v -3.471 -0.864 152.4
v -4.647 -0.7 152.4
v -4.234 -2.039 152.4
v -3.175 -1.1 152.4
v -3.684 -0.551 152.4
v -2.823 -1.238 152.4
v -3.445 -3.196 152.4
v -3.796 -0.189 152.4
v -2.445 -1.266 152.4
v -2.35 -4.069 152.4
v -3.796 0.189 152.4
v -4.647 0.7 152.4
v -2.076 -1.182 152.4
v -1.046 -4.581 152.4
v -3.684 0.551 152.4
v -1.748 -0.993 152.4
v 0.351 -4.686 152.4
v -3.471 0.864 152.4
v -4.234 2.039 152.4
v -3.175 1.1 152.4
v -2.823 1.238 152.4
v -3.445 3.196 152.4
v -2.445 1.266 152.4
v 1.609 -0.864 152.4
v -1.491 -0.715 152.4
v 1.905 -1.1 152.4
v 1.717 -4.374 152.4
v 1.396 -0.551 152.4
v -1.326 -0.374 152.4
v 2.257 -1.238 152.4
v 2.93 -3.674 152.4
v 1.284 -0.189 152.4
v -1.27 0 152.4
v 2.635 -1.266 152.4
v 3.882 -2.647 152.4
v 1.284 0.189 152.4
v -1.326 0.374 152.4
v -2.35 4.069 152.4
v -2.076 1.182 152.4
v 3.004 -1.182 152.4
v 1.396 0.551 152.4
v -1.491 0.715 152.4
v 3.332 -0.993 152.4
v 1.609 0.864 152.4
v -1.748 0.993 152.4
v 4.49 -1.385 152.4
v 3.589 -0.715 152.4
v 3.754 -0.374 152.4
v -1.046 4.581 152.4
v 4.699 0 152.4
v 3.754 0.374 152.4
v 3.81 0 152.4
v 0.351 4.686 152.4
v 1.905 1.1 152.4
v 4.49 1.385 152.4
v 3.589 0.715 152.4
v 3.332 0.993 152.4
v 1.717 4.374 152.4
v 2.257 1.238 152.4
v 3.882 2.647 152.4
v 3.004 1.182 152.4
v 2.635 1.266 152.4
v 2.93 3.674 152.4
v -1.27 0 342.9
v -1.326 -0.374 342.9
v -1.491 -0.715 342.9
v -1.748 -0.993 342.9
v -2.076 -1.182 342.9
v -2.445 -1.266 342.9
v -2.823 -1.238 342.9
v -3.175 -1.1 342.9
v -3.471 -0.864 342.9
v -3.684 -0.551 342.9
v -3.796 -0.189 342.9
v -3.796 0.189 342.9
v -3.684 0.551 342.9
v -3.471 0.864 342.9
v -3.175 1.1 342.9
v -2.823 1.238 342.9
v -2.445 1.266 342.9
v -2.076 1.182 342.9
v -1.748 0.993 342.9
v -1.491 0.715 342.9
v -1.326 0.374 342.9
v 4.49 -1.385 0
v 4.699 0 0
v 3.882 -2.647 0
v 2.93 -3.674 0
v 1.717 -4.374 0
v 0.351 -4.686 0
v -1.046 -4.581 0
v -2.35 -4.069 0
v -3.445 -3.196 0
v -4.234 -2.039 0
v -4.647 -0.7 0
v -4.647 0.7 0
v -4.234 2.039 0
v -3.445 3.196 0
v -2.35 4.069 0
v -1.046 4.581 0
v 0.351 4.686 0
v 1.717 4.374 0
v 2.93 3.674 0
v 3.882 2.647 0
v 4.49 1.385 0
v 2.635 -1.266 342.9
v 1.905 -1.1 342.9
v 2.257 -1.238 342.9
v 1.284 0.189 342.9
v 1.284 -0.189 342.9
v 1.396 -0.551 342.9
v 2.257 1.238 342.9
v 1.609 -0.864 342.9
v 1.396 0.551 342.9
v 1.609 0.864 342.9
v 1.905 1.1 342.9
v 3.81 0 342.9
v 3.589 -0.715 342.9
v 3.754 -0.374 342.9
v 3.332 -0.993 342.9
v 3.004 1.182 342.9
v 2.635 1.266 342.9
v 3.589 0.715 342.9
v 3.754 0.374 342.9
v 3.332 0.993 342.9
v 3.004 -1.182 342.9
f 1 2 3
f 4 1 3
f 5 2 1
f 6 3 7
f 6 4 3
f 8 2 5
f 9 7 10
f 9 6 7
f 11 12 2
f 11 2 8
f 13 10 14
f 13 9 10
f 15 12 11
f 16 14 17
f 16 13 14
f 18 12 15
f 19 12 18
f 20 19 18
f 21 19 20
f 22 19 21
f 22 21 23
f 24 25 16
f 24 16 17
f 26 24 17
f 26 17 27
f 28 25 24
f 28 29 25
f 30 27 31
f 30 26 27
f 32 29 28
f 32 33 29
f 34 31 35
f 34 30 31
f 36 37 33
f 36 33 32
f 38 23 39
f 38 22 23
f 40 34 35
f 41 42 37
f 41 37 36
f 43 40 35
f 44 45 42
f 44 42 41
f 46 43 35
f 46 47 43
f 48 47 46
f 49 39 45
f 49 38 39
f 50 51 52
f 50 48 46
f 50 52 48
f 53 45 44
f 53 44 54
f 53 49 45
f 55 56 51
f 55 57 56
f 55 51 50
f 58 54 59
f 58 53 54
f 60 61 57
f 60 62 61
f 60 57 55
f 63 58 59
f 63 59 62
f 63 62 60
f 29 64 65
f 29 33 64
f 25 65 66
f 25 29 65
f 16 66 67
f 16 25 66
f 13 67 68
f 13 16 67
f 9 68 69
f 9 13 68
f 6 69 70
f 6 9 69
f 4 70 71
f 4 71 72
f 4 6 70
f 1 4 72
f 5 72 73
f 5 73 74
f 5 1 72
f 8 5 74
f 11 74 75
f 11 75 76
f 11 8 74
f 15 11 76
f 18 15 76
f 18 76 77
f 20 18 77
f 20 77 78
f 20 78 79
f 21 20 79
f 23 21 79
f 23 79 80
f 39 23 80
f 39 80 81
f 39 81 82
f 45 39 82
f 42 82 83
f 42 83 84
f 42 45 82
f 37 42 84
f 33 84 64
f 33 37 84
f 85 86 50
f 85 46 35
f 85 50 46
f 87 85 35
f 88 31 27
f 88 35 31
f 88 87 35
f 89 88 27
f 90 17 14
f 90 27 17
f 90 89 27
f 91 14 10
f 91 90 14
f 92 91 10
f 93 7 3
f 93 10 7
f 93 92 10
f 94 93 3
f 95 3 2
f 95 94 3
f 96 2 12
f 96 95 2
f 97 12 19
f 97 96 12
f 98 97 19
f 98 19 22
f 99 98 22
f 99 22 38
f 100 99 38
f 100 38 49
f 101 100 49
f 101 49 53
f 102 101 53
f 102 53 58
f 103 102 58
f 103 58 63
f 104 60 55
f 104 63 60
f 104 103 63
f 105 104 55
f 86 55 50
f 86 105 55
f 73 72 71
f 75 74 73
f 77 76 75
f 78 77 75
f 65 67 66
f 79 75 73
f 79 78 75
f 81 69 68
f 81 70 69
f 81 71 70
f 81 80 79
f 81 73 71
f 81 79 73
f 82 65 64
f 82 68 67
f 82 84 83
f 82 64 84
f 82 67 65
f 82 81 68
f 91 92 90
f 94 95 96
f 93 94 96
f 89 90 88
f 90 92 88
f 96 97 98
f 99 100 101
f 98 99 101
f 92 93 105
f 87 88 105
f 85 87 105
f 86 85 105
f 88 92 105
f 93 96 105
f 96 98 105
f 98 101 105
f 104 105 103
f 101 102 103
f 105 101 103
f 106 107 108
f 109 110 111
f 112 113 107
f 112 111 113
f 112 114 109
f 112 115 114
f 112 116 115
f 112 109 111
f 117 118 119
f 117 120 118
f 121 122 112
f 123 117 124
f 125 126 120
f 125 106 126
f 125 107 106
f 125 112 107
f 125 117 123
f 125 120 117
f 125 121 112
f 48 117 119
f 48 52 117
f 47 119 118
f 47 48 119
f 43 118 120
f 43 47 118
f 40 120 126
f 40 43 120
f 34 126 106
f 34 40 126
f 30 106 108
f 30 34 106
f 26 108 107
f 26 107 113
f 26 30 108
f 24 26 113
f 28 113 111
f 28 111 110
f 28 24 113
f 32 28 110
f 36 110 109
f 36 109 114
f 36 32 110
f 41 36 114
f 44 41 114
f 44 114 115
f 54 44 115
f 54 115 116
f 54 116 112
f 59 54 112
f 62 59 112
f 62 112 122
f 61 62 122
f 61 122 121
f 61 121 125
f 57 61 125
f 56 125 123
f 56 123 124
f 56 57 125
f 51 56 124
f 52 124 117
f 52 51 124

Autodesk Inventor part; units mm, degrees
ref_plane "YZ Plane" through (0, 0, 0) normal (1, 0, 0) x (0, 1, 0)
ref_plane "XZ Plane" through (0, 0, 0) normal (0, 1, 0) x (-1, 0, 0)
ref_plane "XY Plane" through (0, 0, 0) normal (0, 0, 1) x (1, 0, 0)
sketch "Sketch1" plane through (0, 0, 0) normal (0, 0, 1) x (1, 0, 0)
  circle A0 centre (0, 0) radius 4.699
  dimension "d0" = 9.398
extrude "Extrusion1" add sketch "Sketch1" along normal blind 152.4
sketch "Sketch2" plane through (0, 0, 152.4) normal (0, 0, 1) x (1, 0, 0)
  circle A0 centre (0, 0) radius 4.699 construction
  line L0 (-4.699, 0) -> (4.699, 0)
  circle A1 centre (2.54, 0) radius 1.27
  circle A2 centre (-2.54, 0) radius 1.27
  dimension "d3" = 2.54
  dimension "d4" = 2.54
  dimension "d5" = 2.54
  dimension "d6" = 2.54
extrude "Extrusion2" add sketch "Sketch2" along normal blind 190.5
equation "\"d3\" = d4"
equation "\"d6\" = d5"
properties part number "3618K448"
